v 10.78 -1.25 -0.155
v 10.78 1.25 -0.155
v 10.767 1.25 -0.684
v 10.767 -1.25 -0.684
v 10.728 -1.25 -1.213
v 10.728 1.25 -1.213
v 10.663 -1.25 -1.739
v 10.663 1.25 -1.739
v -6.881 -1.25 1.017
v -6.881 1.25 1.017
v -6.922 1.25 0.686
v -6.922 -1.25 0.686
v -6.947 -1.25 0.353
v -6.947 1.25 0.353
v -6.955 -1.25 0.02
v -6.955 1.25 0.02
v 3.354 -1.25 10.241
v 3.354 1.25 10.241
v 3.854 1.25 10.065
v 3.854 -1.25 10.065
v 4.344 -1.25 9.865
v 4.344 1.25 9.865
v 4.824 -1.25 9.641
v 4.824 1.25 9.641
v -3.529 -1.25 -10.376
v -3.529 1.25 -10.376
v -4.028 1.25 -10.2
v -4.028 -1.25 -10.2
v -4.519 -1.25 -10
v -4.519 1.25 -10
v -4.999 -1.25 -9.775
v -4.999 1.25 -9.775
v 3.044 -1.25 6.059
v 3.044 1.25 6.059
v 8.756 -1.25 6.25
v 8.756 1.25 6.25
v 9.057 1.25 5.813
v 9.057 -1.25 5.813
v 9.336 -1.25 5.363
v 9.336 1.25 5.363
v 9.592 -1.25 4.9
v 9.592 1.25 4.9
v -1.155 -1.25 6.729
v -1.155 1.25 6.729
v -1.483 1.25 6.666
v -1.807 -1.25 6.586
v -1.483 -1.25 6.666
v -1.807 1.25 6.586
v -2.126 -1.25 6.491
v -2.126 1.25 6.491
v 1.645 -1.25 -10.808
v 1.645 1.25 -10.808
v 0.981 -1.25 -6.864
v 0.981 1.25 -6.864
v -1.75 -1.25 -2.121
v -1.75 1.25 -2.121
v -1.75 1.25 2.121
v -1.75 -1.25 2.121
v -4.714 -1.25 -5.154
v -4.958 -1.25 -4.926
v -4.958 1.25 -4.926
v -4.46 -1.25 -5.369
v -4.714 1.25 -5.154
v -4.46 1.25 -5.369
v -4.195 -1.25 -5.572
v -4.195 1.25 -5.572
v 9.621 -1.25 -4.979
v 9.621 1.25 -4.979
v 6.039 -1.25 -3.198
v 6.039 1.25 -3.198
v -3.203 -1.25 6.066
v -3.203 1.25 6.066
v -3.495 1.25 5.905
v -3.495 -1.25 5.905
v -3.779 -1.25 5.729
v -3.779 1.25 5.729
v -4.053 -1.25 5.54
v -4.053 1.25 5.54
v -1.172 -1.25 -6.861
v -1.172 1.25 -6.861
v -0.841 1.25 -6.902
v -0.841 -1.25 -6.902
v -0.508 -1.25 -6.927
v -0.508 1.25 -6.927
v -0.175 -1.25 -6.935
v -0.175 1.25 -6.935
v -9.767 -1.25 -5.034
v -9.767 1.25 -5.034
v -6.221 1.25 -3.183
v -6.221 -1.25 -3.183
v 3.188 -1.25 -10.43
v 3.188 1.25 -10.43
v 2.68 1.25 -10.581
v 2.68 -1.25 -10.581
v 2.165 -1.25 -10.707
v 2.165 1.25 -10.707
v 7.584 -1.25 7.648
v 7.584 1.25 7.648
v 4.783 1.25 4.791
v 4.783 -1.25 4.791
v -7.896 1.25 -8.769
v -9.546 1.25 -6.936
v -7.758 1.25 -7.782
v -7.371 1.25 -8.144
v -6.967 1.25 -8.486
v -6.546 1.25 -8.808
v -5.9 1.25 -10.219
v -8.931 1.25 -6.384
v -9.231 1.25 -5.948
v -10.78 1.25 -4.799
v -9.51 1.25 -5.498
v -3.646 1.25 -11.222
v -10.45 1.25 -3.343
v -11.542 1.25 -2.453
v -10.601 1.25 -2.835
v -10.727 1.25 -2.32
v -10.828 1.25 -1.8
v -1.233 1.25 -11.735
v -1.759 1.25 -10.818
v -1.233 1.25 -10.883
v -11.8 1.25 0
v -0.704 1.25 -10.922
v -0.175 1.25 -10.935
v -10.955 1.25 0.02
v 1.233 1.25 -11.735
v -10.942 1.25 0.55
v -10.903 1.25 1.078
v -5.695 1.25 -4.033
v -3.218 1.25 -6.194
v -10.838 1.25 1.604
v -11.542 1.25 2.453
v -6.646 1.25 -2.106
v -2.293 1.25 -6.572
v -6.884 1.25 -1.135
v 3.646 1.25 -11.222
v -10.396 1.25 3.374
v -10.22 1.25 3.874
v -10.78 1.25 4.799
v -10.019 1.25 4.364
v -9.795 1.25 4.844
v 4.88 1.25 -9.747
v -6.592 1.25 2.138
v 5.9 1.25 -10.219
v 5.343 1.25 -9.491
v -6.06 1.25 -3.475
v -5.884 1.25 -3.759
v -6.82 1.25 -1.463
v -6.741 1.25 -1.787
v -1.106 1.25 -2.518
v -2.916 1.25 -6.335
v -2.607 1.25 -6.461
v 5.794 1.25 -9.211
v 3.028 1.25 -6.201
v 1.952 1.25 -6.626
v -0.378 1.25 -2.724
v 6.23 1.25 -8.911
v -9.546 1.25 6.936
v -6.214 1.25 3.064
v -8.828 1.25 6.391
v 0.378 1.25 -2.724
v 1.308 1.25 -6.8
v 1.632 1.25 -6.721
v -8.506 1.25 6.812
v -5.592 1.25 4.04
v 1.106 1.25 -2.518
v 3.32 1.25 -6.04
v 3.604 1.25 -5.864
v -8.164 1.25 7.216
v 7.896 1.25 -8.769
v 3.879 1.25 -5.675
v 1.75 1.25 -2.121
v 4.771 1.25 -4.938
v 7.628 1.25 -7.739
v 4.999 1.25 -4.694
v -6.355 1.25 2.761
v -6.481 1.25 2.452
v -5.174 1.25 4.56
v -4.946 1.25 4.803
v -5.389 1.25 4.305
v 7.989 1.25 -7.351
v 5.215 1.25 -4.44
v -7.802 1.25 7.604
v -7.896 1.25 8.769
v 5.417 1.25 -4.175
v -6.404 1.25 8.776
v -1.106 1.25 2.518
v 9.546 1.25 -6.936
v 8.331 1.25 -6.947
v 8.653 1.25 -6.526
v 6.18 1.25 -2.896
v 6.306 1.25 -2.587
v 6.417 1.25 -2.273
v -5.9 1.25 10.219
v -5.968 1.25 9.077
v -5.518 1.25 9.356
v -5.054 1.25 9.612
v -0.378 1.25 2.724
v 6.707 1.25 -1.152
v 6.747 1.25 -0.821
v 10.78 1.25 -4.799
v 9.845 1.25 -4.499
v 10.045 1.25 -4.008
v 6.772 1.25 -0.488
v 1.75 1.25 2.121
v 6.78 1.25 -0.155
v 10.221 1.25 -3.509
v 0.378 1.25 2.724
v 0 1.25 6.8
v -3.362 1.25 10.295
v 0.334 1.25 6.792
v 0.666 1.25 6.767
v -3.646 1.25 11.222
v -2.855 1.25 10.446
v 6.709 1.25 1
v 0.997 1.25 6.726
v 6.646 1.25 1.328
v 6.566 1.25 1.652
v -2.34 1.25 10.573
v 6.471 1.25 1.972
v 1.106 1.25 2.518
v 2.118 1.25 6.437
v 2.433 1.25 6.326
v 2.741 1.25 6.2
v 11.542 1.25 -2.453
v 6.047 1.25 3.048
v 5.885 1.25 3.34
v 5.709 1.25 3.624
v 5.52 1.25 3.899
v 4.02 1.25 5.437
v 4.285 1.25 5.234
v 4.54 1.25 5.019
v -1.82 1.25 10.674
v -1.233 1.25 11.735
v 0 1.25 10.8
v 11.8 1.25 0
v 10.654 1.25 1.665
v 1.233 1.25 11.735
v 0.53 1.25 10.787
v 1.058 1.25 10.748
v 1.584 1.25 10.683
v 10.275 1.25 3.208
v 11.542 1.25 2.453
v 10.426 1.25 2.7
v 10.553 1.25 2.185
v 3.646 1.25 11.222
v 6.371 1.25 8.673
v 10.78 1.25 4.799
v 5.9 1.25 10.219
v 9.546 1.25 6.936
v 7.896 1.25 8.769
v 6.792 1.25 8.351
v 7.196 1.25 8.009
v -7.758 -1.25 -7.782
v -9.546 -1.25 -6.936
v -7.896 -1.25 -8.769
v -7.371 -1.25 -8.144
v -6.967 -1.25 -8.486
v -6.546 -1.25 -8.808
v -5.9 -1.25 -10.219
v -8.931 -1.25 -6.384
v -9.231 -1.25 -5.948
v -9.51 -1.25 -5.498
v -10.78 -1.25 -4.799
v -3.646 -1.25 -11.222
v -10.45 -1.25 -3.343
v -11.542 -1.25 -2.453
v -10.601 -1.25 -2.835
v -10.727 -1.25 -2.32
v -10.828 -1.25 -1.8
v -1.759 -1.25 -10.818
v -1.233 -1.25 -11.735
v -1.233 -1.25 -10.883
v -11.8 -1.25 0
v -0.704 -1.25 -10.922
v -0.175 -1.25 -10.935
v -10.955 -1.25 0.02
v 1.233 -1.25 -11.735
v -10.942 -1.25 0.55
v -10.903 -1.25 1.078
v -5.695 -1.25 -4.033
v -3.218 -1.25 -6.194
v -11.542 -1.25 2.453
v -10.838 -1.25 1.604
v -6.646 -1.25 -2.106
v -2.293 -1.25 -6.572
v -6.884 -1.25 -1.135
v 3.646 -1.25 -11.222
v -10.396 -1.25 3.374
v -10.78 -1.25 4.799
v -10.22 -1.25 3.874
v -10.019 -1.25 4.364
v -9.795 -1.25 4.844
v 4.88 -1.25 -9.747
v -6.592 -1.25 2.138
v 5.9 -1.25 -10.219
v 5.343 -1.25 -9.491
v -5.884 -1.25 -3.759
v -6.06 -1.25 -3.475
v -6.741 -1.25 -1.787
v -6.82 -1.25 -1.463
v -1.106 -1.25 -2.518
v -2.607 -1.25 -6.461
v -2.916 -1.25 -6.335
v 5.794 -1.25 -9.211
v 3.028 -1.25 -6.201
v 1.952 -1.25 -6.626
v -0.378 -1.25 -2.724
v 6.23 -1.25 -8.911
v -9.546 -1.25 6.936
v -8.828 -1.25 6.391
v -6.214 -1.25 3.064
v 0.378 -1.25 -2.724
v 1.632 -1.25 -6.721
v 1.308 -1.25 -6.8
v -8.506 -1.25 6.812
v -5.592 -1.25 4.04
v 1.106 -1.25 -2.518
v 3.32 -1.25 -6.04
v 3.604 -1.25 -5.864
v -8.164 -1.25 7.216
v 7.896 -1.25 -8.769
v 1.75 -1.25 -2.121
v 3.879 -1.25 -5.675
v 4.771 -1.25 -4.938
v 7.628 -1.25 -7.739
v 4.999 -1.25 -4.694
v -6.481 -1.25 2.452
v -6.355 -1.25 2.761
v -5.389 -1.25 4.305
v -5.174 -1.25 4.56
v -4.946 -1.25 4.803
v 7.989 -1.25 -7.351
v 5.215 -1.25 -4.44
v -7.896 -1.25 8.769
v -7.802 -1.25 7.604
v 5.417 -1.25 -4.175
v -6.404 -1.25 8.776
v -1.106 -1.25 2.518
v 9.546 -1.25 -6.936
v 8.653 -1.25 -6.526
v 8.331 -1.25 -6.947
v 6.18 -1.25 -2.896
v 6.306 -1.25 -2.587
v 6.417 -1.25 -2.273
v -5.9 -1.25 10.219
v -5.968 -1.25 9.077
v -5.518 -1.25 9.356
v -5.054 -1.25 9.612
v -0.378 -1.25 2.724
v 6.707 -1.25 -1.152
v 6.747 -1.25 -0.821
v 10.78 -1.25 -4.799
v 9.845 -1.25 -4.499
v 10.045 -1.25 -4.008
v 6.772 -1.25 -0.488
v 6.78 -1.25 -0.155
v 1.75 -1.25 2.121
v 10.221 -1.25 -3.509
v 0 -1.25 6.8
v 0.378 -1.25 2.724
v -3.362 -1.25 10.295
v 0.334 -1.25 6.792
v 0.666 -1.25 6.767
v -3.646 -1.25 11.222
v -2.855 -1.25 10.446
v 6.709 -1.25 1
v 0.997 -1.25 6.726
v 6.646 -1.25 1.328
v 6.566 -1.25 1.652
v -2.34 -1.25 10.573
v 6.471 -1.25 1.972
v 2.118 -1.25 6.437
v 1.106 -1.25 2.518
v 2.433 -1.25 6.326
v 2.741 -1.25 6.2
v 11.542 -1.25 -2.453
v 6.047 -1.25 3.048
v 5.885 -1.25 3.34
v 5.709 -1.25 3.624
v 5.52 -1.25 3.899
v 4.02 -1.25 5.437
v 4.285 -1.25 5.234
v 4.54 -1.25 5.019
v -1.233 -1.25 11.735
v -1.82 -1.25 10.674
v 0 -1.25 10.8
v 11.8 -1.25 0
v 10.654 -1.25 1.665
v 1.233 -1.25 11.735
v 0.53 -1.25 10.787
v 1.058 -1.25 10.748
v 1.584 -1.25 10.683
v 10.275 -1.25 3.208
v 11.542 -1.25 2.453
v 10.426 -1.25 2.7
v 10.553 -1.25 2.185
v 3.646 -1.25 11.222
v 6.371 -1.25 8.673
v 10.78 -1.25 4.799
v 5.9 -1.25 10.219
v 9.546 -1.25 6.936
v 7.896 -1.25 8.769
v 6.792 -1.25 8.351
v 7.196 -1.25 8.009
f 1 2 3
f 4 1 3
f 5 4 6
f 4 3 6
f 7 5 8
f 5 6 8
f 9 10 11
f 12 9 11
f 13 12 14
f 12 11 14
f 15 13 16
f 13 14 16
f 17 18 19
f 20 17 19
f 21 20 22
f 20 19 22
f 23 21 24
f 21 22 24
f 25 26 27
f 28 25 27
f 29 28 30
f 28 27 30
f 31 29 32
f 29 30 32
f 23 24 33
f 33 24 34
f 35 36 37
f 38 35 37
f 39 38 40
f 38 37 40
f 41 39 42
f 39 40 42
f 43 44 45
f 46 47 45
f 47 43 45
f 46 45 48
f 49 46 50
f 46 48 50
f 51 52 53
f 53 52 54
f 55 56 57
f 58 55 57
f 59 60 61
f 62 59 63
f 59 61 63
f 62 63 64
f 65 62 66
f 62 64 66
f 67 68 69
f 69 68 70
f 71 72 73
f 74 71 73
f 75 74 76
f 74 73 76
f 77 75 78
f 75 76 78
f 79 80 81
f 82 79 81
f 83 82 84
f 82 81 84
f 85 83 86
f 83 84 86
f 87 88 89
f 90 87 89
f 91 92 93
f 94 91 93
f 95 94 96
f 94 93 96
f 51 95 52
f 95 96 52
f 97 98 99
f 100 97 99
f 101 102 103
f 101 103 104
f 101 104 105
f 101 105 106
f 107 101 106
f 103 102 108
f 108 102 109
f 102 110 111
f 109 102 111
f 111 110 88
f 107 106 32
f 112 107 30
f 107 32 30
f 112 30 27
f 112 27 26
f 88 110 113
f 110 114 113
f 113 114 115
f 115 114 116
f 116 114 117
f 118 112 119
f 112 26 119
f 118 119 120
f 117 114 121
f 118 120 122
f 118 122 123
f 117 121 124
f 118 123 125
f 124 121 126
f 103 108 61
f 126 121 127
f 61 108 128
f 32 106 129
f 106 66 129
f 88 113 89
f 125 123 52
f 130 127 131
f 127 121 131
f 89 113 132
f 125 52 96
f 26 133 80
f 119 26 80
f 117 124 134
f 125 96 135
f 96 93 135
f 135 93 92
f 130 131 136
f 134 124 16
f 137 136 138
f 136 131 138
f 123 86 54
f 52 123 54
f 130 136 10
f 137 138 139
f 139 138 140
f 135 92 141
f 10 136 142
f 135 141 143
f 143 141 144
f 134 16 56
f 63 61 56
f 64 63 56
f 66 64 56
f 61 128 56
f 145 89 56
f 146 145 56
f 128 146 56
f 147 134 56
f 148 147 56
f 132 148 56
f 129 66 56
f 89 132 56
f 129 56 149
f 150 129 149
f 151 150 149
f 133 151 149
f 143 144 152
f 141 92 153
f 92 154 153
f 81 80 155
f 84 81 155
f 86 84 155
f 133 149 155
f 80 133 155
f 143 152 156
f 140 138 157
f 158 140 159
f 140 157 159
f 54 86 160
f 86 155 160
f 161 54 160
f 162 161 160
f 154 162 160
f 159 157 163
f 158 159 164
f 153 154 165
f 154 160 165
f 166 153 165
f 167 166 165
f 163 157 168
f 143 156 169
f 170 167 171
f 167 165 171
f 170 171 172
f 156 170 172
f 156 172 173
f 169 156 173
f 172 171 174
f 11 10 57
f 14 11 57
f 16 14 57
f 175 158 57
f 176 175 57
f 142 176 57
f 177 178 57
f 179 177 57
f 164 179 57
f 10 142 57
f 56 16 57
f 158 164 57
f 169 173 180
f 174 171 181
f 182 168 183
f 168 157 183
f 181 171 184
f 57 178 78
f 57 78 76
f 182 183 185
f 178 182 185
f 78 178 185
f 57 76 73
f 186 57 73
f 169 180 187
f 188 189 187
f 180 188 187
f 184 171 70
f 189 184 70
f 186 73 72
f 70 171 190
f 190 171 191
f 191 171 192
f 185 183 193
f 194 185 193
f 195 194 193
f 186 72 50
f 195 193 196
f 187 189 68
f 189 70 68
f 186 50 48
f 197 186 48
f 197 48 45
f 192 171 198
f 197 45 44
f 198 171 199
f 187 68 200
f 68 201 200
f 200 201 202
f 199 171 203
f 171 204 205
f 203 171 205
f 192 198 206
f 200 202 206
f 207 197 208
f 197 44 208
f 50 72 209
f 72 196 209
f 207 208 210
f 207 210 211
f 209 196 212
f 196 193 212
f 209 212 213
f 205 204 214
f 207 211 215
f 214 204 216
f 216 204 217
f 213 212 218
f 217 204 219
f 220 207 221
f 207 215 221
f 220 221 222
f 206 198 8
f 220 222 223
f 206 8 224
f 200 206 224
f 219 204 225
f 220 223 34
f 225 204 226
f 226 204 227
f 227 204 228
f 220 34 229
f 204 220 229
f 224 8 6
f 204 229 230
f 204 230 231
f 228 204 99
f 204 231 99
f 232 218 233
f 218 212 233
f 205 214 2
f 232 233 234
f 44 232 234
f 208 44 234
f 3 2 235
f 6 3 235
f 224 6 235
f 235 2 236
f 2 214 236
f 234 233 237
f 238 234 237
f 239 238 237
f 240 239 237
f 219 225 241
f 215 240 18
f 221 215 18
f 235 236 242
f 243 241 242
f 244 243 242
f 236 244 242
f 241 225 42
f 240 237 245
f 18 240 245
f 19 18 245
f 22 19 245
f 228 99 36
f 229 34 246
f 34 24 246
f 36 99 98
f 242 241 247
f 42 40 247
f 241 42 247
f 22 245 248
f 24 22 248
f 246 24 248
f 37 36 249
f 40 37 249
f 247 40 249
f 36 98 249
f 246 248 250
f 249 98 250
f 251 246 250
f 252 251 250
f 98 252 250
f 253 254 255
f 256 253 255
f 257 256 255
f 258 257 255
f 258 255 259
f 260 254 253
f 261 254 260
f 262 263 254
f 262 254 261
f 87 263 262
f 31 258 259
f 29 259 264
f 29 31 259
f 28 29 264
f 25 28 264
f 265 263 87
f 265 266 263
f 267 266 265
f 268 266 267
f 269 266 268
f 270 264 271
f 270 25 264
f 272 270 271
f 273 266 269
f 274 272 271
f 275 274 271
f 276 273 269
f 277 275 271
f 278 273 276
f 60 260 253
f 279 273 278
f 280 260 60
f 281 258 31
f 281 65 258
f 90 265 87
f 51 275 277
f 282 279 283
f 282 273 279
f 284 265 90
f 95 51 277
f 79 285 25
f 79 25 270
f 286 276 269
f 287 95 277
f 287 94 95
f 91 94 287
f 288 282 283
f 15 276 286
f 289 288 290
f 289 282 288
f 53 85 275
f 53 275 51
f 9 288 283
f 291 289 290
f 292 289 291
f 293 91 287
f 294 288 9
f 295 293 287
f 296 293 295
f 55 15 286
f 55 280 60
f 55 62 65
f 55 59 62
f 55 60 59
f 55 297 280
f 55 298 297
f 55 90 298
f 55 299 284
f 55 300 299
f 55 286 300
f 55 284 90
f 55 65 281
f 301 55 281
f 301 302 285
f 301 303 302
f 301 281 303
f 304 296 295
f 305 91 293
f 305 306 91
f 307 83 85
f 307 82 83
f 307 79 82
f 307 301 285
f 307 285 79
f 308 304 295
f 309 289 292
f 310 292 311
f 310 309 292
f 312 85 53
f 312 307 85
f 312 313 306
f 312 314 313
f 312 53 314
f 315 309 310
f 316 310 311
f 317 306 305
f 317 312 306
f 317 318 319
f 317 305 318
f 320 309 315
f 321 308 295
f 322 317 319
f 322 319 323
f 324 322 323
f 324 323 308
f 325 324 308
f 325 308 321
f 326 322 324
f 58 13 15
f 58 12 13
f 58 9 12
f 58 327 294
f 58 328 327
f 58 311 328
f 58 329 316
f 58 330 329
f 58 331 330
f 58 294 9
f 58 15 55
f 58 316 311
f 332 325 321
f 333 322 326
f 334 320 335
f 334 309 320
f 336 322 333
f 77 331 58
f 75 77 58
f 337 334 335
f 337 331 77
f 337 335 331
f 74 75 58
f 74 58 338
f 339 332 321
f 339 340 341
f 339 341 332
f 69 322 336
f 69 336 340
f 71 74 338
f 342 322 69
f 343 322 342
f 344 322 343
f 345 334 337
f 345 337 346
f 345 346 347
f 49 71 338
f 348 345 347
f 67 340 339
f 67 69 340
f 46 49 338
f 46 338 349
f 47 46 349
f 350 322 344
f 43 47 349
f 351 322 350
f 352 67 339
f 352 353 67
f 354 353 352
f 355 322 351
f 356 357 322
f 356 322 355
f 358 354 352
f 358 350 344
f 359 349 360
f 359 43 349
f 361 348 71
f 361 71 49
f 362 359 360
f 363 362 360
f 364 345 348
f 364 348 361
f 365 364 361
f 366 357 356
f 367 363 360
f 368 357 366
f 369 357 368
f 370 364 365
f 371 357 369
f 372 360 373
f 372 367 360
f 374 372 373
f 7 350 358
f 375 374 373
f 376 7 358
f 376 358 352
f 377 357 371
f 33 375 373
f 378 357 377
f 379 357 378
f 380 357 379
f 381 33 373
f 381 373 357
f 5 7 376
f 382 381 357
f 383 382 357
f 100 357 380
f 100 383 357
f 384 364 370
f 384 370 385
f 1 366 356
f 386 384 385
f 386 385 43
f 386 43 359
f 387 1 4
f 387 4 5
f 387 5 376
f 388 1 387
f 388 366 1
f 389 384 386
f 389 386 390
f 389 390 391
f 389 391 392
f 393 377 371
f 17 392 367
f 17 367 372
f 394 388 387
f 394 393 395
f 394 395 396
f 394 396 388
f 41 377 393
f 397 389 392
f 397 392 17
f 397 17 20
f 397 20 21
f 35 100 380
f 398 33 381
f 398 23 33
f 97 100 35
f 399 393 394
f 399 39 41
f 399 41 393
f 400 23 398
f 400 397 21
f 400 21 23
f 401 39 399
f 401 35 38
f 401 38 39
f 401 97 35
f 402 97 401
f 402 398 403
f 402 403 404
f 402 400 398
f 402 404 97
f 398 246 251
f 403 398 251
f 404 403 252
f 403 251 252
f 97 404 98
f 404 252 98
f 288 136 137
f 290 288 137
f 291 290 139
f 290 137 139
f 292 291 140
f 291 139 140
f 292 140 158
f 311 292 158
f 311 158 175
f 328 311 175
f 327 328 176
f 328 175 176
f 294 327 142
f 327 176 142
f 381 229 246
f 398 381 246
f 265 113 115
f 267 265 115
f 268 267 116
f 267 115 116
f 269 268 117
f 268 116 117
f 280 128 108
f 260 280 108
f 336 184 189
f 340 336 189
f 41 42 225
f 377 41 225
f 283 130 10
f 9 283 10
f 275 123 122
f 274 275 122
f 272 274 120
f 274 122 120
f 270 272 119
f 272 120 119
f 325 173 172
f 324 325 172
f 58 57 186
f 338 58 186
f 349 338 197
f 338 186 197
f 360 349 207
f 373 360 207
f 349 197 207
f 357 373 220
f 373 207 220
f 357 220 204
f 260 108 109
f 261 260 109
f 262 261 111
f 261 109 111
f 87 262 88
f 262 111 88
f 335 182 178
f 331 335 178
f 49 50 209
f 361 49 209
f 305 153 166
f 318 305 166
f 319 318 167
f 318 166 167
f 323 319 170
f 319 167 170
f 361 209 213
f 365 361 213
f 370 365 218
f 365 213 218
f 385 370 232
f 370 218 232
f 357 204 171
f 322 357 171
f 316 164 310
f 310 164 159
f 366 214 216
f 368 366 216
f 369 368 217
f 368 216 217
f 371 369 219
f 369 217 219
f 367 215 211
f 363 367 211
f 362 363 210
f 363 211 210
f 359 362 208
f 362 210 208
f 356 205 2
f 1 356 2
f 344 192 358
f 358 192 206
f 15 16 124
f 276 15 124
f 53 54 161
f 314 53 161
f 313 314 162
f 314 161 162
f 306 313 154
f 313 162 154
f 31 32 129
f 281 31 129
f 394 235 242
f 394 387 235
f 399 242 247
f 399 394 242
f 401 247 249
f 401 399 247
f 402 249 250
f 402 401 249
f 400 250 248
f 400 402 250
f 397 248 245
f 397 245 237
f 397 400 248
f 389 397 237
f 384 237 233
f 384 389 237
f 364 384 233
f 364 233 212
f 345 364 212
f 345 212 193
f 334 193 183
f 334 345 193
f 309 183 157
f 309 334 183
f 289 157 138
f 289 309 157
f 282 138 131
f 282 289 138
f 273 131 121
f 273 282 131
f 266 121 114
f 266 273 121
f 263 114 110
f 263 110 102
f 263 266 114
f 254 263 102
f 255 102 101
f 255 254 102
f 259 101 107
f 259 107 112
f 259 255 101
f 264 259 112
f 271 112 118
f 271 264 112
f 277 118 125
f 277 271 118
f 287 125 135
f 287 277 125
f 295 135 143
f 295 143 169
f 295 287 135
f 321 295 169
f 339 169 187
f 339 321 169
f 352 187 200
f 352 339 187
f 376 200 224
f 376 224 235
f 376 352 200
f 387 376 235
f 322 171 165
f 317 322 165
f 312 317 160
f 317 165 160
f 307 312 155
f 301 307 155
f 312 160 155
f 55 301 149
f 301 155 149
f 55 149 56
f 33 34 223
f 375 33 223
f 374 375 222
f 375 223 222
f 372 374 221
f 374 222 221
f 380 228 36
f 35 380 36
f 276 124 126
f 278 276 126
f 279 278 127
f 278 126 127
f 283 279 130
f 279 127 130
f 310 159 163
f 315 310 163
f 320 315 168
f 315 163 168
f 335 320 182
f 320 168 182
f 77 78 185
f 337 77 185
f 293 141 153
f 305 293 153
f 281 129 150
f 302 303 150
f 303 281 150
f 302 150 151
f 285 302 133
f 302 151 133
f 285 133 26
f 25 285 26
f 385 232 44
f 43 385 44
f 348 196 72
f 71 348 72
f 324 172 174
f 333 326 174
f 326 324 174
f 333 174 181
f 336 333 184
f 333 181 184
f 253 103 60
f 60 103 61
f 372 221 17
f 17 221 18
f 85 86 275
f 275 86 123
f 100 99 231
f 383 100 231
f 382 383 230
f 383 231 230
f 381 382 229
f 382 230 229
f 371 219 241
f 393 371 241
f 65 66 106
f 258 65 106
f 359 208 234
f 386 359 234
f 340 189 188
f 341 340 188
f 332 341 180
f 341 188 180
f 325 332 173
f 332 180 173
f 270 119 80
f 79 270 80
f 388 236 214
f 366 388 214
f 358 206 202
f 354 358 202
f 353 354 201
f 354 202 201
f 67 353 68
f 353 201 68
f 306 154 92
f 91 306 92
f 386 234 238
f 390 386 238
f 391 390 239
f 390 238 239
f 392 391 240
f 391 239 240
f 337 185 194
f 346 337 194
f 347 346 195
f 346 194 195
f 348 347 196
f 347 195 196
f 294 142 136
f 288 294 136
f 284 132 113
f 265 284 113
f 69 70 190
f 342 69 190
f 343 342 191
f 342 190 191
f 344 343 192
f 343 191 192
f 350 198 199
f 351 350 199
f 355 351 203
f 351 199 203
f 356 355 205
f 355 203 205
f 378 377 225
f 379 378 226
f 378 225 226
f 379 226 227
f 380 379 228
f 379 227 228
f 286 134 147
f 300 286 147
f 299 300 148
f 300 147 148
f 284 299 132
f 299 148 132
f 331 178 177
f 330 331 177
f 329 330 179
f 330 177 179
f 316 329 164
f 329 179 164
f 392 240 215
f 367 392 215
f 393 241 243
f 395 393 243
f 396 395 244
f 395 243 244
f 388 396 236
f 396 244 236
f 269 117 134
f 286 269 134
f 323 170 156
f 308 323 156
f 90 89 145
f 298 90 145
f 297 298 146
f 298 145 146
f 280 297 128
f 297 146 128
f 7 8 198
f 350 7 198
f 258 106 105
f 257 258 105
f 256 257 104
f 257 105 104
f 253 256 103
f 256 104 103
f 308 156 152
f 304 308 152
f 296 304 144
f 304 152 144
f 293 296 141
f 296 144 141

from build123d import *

# Parameters (mm, degrees)
F0_R     = 11.8
F1_DEPTH = 1.25
F3_DEPTH = 2.501
F5_DEPTH = 2.501


with BuildPart() as f1:
    # F0 (on Front) → F1 (new body, symmetric)
    with BuildSketch(Plane.XZ):
        Circle(F0_R)
    extrude(amount=F1_DEPTH, both=True)

    # F2 (on face) → F3 (cut, through all)
    with BuildSketch(Plane(origin=(0, 1.25, 0), x_dir=(-1, 0, 0), z_dir=(0, 1, 0))):
        with BuildLine():
            ThreePointArc((0, 10.8), (-0.794118, 10.770765), (-1.583936, 10.683218))
            Line((-1.583936, 10.683218), (-0.997293, 6.726471))
            ThreePointArc((-0.997293, 6.726471), (-0.5, 6.781593), (0, 6.8))
            Line((0, 6.8), (0, 10.8))
        make_face()
        with BuildLine():
            ThreePointArc((-6.371006, 8.673176), (-6.996277, 8.182754), (-7.583795, 7.647683))
            Line((-7.583795, 7.647683), (-4.783473, 4.791428))
            ThreePointArc((-4.783473, 4.791428), (-4.413554, 5.128324), (-4.019865, 5.437108))
            Line((-4.019865, 5.437108), (-6.371006, 8.673176))
        make_face()
        with BuildLine():
            ThreePointArc((-8.755893, 6.249643), (-9.199012, 5.590005), (-9.592429, 4.899569))
            Line((-9.592429, 4.899569), (-6.046533, 3.048456))
            ThreePointArc((-6.046533, 3.048456), (-5.798826, 3.483174), (-5.519825, 3.898502))
            Line((-5.519825, 3.898502), (-8.755893, 6.249643))
        make_face()
        with BuildLine():
            ThreePointArc((-10.275143, 3.207756), (-10.492735, 2.443471), (-10.65354, 1.665256))
            Line((-10.65354, 1.665256), (-6.709167, 1.000484))
            ThreePointArc((-6.709167, 1.000484), (-6.607919, 1.490472), (-6.470917, 1.971688))
            Line((-6.470917, 1.971688), (-10.275143, 3.207756))
        make_face()
        with BuildLine():
            ThreePointArc((-10.78004, -0.154725), (-10.750805, -0.948842), (-10.663258, -1.738661))
            Line((-10.663258, -1.738661), (-6.706511, -1.152018))
            ThreePointArc((-6.706511, -1.152018), (-6.761633, -0.654725), (-6.78004, -0.154725))
            Line((-6.78004, -0.154725), (-10.78004, -0.154725))
        make_face()
        with BuildLine():
            ThreePointArc((-10.221163, -3.508656), (-9.947962, -4.254872), (-9.620633, -4.978981))
            Line((-9.620633, -4.978981), (-6.038825, -3.198348))
            ThreePointArc((-6.038825, -3.198348), (-6.244922, -2.742428), (-6.416936, -2.272588))
            Line((-6.416936, -2.272588), (-10.221163, -3.508656))
        make_face()
        with BuildLine():
            ThreePointArc((-8.653216, -6.525731), (-8.162794, -7.151002), (-7.627724, -7.738519))
            Line((-7.627724, -7.738519), (-4.771468, -4.938197))
            ThreePointArc((-4.771468, -4.938197), (-5.108364, -4.568279), (-5.417149, -4.17459))
            Line((-5.417149, -4.17459), (-8.653216, -6.525731))
        make_face()
        with BuildLine():
            ThreePointArc((-6.229684, -8.910618), (-5.570045, -9.353737), (-4.87961, -9.747154))
            Line((-4.87961, -9.747154), (-3.028496, -6.201258))
            ThreePointArc((-3.028496, -6.201258), (-3.463215, -5.953551), (-3.878543, -5.67455))
            Line((-3.878543, -5.67455), (-6.229684, -8.910618))
        make_face()
        with BuildLine():
            ThreePointArc((-3.187796, -10.429868), (-2.423511, -10.647459), (-1.645296, -10.808264))
            Line((-1.645296, -10.808264), (-0.980524, -6.863891))
            ThreePointArc((-0.980524, -6.863891), (-1.470512, -6.762644), (-1.951728, -6.625641))
            Line((-1.951728, -6.625641), (-3.187796, -10.429868))
        make_face()
        with BuildLine():
            ThreePointArc((0.174684, -10.934765), (0.968802, -10.90553), (1.75862, -10.817983))
            Line((1.75862, -10.817983), (1.171977, -6.861235))
            ThreePointArc((1.171977, -6.861235), (0.674684, -6.916358), (0.174684, -6.934765))
            Line((0.174684, -6.934765), (0.174684, -10.934765))
        make_face()
        with BuildLine():
            ThreePointArc((3.528615, -10.375887), (4.274832, -10.102687), (4.99894, -9.775358))
            Line((4.99894, -9.775358), (3.218308, -6.19355))
            ThreePointArc((3.218308, -6.19355), (2.762387, -6.399646), (2.292547, -6.571661))
            Line((2.292547, -6.571661), (3.528615, -10.375887))
        make_face()
        with BuildLine():
            ThreePointArc((6.545691, -8.807941), (7.170961, -8.317519), (7.758479, -7.782448))
            Line((7.758479, -7.782448), (4.958157, -4.926192))
            ThreePointArc((4.958157, -4.926192), (4.588239, -5.263089), (4.19455, -5.571873))
            Line((4.19455, -5.571873), (6.545691, -8.807941))
        make_face()
        with BuildLine():
            ThreePointArc((8.930578, -6.384408), (9.373697, -5.72477), (9.767113, -5.034334))
            Line((9.767113, -5.034334), (6.221217, -3.183221))
            ThreePointArc((6.221217, -3.183221), (5.973511, -3.617939), (5.69451, -4.033267))
            Line((5.69451, -4.033267), (8.930578, -6.384408))
        make_face()
        with BuildLine():
            ThreePointArc((10.449827, -3.342521), (10.667419, -2.578236), (10.828224, -1.800021))
            Line((10.828224, -1.800021), (6.883851, -1.135249))
            ThreePointArc((6.883851, -1.135249), (6.782603, -1.625237), (6.645601, -2.106453))
            Line((6.645601, -2.106453), (10.449827, -3.342521))
        make_face()
        with BuildLine():
            ThreePointArc((10.954725, 0.01996), (10.92549, 0.814077), (10.837943, 1.603896))
            Line((10.837943, 1.603896), (6.881195, 1.017253))
            ThreePointArc((6.881195, 1.017253), (6.936317, 0.51996), (6.954725, 0.01996))
            Line((6.954725, 0.01996), (10.954725, 0.01996))
        make_face()
        with BuildLine():
            ThreePointArc((10.395847, 3.373891), (10.122647, 4.120107), (9.795317, 4.844216))
            Line((9.795317, 4.844216), (6.21351, 3.063583))
            ThreePointArc((6.21351, 3.063583), (6.419606, 2.607663), (6.591621, 2.137823))
            Line((6.591621, 2.137823), (10.395847, 3.373891))
        make_face()
        with BuildLine():
            ThreePointArc((8.827901, 6.390966), (8.337478, 7.016237), (7.802408, 7.603754))
            Line((7.802408, 7.603754), (4.946152, 4.803432))
            ThreePointArc((4.946152, 4.803432), (5.283048, 4.433514), (5.591833, 4.039825))
            Line((5.591833, 4.039825), (8.827901, 6.390966))
        make_face()
        with BuildLine():
            ThreePointArc((6.404368, 8.775853), (5.744729, 9.218972), (5.054294, 9.612389))
            Line((5.054294, 9.612389), (3.20318, 6.066493))
            ThreePointArc((3.20318, 6.066493), (3.637899, 5.818786), (4.053227, 5.539785))
            Line((4.053227, 5.539785), (6.404368, 8.775853))
        make_face()
        with BuildLine():
            ThreePointArc((3.362481, 10.295103), (2.598196, 10.512694), (1.81998, 10.6735))
            Line((1.81998, 10.6735), (1.155209, 6.729126))
            ThreePointArc((1.155209, 6.729126), (1.645196, 6.627879), (2.126413, 6.490877))
            Line((2.126413, 6.490877), (3.362481, 10.295103))
        make_face()
        with BuildLine():
            ThreePointArc((-3.353931, 10.241122), (-4.100148, 9.967922), (-4.824256, 9.640593))
            Line((-4.824256, 9.640593), (-3.043623, 6.058785))
            ThreePointArc((-3.043623, 6.058785), (-2.587703, 6.264881), (-2.117863, 6.436896))
            Line((-2.117863, 6.436896), (-3.353931, 10.241122))
        make_face()
    extrude(amount=-F3_DEPTH, mode=Mode.SUBTRACT)

    # F4 (on face) → F5 (cut, through all)
    with BuildSketch(Plane(origin=(0, 1.25, 0), x_dir=(-1, 0, 0), z_dir=(0, 1, 0))):
        with BuildLine():
            Line((-1.75, 2.12132), (-1.75, -2.12132))
            ThreePointArc((-1.75, -2.12132), (0, -2.75), (1.75, -2.12132))
            Line((1.75, -2.12132), (1.75, 2.12132))
            ThreePointArc((1.75, 2.12132), (0, 2.75), (-1.75, 2.12132))
        make_face()
    extrude(amount=-F5_DEPTH, mode=Mode.SUBTRACT)


solid = f1.part
